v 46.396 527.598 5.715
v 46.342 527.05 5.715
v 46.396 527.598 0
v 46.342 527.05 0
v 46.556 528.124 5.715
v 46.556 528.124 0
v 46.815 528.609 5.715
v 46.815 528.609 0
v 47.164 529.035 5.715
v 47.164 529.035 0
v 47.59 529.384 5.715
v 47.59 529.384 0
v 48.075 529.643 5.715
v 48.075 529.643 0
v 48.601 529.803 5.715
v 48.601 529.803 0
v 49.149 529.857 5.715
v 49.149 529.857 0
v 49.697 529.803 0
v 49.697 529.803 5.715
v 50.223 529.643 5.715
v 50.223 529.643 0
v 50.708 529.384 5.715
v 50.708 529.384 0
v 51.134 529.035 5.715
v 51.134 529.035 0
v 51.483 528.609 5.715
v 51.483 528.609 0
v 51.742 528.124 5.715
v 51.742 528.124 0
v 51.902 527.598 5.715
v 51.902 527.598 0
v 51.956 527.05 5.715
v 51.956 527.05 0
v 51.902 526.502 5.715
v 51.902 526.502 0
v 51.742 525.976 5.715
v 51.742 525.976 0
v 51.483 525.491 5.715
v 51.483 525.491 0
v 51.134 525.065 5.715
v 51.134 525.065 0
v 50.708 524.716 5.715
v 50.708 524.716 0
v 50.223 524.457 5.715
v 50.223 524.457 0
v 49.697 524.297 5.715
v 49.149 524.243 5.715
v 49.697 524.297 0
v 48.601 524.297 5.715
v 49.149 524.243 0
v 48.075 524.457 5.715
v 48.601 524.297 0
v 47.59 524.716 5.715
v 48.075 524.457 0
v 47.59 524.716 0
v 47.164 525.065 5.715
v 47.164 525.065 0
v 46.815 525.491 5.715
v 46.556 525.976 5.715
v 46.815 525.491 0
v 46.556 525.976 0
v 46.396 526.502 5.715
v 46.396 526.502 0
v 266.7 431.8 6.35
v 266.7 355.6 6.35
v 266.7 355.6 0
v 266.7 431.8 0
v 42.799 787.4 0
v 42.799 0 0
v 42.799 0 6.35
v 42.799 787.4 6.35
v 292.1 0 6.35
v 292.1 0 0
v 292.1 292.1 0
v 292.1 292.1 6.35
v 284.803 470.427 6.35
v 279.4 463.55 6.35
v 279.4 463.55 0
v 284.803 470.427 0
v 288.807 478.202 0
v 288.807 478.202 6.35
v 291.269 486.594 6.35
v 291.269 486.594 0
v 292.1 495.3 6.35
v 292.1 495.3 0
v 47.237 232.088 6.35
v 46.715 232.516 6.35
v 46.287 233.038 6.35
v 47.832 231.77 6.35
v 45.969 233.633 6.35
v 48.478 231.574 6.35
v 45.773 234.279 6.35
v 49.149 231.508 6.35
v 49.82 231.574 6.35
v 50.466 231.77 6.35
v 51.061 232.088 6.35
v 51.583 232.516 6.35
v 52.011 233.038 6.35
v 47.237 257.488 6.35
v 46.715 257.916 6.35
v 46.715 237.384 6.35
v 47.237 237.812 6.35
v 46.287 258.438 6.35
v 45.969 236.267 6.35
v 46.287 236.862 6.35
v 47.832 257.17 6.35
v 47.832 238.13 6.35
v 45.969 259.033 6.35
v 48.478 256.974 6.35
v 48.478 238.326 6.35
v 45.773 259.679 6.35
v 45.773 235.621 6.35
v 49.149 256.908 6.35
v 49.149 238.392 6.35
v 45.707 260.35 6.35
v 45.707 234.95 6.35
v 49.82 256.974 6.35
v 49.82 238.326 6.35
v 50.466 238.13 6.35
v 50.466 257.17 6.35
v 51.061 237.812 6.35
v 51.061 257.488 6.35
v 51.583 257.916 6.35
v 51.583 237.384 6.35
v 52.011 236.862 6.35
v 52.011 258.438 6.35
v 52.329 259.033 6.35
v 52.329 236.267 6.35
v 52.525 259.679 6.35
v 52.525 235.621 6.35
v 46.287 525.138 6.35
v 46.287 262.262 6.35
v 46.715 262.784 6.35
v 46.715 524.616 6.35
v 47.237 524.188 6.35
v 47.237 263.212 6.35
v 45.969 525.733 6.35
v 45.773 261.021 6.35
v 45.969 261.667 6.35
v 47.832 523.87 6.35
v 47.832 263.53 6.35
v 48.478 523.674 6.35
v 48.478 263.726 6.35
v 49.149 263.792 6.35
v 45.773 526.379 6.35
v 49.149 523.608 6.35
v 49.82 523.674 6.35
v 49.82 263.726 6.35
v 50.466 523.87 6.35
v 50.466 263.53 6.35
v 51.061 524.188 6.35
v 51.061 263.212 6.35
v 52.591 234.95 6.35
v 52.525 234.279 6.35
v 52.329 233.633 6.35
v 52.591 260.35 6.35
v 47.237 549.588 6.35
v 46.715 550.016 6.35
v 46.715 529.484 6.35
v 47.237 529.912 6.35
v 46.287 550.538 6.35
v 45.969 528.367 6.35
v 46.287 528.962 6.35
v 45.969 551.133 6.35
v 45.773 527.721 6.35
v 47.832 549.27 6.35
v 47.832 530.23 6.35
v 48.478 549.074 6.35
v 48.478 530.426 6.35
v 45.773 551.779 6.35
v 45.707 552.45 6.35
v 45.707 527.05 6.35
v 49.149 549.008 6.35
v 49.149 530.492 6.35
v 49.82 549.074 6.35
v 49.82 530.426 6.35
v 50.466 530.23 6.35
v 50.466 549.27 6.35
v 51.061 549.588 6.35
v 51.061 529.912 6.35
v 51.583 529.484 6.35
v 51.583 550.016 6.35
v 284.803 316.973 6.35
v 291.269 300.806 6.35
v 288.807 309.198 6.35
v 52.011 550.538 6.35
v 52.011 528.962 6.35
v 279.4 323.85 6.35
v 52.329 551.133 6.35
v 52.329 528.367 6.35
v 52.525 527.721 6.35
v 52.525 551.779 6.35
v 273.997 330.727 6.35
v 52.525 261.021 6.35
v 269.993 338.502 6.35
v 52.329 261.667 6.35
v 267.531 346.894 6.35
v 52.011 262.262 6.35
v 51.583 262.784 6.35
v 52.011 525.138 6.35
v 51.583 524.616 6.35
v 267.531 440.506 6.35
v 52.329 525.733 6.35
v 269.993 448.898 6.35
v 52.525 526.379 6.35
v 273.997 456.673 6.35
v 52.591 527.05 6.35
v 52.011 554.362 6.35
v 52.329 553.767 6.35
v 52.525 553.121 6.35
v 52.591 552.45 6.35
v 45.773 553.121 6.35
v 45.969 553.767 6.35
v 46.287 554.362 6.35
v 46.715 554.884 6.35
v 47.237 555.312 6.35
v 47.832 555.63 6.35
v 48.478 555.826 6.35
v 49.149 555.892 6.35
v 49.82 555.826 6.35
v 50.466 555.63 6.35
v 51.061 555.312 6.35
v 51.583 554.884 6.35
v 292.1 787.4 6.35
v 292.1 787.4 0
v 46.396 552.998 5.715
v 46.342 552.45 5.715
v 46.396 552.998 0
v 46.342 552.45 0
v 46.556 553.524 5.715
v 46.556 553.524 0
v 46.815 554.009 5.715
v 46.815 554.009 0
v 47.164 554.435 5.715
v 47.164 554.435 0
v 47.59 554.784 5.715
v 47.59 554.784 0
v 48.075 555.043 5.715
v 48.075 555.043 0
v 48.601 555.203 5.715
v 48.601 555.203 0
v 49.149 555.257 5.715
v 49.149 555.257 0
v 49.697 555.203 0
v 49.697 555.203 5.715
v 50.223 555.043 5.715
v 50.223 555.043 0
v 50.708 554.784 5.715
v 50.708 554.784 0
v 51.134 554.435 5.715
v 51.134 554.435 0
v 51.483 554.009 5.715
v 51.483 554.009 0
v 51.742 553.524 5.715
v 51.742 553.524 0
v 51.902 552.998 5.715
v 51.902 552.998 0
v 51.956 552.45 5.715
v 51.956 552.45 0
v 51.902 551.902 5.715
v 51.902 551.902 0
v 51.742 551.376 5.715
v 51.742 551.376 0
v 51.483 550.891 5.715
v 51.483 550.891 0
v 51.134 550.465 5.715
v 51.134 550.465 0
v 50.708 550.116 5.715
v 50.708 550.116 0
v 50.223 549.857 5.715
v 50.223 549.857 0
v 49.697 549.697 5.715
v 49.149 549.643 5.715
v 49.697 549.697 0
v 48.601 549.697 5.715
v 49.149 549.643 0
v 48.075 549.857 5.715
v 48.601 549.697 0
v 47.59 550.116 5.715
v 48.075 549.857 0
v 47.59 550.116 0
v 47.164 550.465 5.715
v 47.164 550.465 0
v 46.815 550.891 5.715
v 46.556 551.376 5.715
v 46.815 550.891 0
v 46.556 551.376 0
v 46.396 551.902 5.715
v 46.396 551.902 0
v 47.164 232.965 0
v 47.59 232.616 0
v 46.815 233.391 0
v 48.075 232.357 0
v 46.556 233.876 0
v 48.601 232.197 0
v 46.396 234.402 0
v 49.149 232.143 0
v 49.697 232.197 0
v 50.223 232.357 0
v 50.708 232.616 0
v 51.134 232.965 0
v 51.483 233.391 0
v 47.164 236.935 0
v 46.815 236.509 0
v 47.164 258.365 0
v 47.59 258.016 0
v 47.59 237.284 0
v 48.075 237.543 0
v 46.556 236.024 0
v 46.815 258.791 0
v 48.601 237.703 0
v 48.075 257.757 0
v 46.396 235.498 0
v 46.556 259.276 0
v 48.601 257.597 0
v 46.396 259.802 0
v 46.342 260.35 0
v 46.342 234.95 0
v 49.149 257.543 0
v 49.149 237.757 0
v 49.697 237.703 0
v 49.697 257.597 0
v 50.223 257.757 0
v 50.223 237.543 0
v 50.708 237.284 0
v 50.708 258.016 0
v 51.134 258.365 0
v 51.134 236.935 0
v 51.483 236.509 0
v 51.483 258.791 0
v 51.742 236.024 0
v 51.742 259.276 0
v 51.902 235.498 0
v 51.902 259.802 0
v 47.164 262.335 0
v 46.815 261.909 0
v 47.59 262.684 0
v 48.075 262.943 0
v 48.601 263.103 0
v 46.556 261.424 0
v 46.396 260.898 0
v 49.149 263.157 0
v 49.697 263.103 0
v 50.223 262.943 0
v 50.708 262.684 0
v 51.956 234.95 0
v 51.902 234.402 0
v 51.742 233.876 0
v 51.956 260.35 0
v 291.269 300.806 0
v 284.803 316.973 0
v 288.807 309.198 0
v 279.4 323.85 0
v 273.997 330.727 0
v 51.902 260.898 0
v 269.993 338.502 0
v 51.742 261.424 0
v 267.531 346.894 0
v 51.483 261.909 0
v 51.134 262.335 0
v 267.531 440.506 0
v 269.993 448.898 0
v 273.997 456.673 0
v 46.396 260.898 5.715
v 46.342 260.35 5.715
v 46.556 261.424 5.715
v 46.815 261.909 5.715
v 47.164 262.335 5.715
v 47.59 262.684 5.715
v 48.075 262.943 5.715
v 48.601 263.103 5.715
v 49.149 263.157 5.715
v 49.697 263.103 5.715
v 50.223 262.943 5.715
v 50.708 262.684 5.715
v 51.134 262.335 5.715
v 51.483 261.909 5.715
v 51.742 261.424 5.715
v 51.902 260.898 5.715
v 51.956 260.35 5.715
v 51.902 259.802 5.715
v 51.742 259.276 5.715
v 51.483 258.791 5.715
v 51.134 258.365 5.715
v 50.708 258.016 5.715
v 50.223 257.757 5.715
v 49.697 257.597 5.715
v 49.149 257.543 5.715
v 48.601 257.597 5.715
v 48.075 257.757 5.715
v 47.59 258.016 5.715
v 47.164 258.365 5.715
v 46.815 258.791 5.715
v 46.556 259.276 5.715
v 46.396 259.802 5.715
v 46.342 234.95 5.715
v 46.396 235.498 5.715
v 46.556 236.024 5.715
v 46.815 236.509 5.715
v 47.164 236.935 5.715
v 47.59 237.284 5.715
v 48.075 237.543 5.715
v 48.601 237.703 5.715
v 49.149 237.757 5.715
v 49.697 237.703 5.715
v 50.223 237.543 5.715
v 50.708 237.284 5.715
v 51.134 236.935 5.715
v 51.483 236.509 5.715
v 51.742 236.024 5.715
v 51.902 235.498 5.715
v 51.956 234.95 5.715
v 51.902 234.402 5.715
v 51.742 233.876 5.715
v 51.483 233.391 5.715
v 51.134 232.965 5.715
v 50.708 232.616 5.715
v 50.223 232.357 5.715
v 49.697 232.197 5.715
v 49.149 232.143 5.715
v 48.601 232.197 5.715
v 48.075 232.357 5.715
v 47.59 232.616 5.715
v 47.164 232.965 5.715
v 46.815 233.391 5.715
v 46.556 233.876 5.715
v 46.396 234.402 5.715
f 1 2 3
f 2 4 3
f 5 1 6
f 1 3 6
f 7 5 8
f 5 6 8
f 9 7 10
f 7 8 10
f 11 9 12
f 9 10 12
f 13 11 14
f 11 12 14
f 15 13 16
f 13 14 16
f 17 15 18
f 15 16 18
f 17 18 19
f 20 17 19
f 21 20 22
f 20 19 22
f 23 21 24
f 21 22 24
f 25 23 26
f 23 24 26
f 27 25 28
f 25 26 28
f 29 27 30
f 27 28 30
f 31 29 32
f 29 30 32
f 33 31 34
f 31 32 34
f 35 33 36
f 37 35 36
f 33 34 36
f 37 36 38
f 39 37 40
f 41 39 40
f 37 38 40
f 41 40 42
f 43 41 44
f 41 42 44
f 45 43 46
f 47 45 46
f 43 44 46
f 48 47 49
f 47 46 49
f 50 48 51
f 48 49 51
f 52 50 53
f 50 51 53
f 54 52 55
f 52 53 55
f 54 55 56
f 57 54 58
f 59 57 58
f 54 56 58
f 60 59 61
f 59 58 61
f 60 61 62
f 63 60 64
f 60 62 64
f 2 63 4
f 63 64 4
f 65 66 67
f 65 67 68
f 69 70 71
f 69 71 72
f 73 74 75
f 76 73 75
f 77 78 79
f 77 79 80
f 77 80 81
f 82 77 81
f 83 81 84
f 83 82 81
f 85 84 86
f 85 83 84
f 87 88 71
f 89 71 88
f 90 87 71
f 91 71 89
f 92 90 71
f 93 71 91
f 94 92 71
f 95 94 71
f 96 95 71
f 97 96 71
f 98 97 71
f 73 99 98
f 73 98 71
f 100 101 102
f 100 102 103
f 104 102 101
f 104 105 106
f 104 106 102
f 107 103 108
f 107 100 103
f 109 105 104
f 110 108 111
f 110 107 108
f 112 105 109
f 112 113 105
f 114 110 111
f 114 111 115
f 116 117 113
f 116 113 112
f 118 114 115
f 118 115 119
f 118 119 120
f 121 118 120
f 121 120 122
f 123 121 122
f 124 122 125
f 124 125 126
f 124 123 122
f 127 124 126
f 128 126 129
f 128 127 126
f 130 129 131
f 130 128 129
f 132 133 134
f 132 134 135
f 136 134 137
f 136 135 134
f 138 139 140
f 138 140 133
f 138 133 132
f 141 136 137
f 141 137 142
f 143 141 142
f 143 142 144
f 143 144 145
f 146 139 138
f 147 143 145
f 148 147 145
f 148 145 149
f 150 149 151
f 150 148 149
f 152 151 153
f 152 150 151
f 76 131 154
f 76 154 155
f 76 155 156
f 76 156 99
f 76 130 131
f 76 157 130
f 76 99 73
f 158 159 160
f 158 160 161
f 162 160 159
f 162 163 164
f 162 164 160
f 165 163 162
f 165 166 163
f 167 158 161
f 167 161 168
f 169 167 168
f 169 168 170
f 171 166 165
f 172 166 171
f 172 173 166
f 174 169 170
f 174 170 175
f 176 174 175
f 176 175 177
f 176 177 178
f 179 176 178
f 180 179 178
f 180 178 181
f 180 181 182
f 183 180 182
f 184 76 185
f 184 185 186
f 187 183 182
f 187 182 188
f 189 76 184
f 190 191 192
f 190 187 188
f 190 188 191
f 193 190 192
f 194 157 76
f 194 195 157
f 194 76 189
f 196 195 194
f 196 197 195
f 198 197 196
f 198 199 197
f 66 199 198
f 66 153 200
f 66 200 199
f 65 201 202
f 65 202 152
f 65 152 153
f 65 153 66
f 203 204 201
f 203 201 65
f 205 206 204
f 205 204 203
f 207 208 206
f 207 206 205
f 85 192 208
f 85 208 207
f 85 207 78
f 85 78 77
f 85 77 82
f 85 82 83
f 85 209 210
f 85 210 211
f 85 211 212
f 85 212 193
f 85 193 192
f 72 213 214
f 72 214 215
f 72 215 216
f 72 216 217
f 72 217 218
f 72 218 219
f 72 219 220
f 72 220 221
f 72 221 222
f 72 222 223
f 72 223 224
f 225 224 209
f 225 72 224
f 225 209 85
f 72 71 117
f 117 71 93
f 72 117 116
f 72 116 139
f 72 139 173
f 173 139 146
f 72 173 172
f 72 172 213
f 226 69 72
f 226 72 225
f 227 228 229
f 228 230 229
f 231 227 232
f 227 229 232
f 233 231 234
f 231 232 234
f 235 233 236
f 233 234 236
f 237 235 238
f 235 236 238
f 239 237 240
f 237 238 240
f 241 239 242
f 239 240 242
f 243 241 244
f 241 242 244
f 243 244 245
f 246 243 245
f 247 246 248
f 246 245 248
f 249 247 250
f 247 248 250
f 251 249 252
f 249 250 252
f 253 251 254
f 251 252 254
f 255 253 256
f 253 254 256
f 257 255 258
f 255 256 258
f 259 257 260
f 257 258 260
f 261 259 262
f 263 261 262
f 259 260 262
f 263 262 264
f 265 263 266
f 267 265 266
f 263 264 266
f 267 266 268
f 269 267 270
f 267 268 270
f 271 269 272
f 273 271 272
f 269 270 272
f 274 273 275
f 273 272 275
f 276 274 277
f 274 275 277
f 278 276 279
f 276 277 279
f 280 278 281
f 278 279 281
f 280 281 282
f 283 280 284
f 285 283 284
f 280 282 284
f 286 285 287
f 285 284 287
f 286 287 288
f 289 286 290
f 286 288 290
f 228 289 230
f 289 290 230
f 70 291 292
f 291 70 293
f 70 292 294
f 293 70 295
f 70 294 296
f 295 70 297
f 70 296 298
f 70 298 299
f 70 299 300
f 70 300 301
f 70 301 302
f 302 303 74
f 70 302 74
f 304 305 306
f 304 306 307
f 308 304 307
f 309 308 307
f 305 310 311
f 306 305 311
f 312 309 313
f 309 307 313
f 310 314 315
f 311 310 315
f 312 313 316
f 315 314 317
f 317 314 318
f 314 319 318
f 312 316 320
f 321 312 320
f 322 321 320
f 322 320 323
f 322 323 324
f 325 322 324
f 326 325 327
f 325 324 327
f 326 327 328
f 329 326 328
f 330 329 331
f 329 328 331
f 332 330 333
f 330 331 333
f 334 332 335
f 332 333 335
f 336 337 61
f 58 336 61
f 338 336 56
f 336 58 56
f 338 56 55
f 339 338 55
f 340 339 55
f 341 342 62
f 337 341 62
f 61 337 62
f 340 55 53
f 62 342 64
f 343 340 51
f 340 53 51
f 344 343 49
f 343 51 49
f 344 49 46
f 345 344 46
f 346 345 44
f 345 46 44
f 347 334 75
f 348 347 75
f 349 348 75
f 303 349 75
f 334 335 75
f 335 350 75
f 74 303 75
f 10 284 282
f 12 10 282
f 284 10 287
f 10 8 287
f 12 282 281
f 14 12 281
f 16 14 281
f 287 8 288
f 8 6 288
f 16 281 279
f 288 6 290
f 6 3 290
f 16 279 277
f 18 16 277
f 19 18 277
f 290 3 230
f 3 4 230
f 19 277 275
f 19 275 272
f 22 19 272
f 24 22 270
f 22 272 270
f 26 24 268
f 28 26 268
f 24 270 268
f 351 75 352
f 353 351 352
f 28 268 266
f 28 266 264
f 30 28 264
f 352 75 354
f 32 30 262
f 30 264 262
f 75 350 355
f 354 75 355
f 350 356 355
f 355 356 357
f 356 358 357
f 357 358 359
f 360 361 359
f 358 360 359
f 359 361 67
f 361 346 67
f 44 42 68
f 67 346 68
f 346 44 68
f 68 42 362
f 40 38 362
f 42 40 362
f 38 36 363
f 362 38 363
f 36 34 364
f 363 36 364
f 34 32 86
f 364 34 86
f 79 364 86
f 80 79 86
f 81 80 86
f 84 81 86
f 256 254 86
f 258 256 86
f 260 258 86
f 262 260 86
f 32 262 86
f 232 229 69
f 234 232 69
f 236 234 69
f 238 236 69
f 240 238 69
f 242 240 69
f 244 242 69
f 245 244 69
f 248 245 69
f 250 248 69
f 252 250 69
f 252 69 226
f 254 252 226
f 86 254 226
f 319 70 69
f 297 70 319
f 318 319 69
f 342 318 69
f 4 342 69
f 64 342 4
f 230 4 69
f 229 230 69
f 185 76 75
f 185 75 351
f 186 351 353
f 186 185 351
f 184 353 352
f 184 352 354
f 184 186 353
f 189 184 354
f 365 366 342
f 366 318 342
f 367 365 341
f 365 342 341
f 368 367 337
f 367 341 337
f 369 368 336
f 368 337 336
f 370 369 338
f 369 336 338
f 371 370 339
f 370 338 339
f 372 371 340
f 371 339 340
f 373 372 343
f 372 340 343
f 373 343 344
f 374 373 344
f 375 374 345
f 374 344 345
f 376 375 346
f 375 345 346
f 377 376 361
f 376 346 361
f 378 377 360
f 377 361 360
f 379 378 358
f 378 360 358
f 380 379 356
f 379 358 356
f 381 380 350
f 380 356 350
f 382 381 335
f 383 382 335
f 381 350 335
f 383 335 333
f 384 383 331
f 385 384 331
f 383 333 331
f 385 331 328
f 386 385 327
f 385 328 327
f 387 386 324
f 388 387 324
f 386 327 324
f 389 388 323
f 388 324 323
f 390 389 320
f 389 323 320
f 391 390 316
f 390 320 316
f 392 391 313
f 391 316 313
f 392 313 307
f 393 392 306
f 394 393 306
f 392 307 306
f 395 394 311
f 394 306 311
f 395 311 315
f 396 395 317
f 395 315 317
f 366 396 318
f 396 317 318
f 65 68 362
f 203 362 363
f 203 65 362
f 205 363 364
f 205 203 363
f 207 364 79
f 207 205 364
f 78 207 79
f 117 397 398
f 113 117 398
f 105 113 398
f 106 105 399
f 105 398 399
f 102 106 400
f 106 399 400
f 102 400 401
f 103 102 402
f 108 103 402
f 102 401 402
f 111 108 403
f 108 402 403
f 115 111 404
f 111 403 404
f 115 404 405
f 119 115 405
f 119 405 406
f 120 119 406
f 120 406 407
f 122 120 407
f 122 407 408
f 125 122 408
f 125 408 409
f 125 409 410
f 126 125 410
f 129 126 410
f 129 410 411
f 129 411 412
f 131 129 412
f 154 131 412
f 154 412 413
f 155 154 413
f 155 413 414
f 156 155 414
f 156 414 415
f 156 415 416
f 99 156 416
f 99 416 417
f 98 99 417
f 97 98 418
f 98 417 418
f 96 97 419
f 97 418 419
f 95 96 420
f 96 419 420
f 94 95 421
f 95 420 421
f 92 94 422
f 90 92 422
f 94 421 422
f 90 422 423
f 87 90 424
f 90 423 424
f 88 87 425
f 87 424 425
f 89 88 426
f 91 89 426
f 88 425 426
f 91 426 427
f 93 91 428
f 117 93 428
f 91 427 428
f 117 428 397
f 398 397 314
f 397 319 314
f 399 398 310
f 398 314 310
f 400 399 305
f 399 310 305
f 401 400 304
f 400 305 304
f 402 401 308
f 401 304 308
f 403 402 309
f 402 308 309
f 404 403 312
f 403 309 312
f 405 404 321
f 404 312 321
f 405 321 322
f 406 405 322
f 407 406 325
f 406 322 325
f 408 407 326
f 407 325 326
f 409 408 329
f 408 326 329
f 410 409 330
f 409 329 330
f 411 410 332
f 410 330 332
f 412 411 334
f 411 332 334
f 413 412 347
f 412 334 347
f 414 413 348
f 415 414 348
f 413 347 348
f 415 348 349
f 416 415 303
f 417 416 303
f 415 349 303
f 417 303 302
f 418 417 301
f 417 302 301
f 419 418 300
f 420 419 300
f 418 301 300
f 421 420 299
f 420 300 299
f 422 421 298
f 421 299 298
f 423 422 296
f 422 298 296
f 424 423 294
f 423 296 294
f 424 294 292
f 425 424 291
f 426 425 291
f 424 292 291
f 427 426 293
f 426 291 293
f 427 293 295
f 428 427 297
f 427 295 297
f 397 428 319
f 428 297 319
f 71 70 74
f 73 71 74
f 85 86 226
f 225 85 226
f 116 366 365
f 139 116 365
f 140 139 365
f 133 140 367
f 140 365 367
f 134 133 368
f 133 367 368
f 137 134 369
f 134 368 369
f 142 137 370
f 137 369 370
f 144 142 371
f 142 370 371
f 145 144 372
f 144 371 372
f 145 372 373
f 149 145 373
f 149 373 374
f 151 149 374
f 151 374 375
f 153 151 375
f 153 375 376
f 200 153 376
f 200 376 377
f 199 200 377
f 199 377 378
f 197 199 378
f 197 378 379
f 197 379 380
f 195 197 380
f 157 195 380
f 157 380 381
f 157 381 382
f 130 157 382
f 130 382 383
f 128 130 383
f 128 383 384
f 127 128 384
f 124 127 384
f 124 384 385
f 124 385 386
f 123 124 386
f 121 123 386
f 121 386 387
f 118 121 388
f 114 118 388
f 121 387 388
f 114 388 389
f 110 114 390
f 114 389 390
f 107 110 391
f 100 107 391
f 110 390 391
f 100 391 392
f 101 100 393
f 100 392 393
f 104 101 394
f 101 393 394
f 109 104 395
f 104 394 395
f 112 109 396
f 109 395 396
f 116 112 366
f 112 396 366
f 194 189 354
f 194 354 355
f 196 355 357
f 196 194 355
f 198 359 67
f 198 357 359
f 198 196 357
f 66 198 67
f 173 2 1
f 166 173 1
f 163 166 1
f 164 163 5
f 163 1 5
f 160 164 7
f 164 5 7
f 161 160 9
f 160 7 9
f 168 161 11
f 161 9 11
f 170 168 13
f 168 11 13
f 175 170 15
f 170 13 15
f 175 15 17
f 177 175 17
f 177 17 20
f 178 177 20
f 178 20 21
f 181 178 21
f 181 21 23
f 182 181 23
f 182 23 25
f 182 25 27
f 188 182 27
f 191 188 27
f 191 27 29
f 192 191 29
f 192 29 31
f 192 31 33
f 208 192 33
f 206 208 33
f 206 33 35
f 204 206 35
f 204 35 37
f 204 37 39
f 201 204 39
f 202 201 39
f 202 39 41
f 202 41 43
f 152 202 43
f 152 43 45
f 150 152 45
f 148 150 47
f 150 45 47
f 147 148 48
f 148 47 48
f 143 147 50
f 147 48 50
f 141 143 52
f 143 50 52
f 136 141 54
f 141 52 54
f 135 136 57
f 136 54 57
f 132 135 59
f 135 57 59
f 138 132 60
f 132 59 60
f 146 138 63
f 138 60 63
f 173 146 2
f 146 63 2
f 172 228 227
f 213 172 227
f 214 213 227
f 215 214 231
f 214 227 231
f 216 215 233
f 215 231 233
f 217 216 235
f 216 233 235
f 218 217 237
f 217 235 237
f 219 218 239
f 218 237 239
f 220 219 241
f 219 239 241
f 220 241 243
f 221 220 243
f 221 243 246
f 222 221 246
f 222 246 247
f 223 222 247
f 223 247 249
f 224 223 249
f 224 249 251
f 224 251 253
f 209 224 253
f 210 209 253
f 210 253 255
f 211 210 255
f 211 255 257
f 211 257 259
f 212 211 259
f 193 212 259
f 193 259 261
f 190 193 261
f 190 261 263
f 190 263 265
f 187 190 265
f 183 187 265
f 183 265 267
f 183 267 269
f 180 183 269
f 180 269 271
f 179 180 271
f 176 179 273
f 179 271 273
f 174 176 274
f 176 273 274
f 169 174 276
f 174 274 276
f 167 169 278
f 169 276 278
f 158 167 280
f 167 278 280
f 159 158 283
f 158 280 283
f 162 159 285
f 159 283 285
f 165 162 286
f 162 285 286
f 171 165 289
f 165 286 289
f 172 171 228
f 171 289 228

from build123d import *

# Parameters (mm, degrees)
SKETCH1_W                        = 249.301
SKETCH1_H                        = 787.4
BOSS_EXTRUDE1_DEPTH              = 6.35
F_10_CLEARANCE_HOLE1_D           = 5.6134
F_10_CLEARANCE_HOLE1_CSINK_D     = 6.8834
F_10_CLEARANCE_HOLE1_CSINK_ANGLE = 90
CUT_EXTRUDE1_DEPTH               = 840.858019251


with BuildPart() as part:
    # Sketch1 → Boss-Extrude1 (new body)
    with BuildSketch(Plane.XY):
        with Locations((167.4495, 393.7)):
            Rectangle(SKETCH1_W, SKETCH1_H)
    extrude(amount=BOSS_EXTRUDE1_DEPTH)

    # #10 Clearance Hole1 (through all)
    with Locations(Plane.XY.offset(6.35)):
        with Locations((49.149, 552.45), (49.149, 527.05), (49.149, 260.35), (49.149, 234.95)):
            CounterSinkHole(F_10_CLEARANCE_HOLE1_D / 2, F_10_CLEARANCE_HOLE1_CSINK_D / 2, counter_sink_angle=F_10_CLEARANCE_HOLE1_CSINK_ANGLE)

    # Sketch6 → Cut-Extrude1 (cut, through all)
    with BuildSketch(Plane.XY.offset(6.35)):
        with BuildLine():
            Line((292.1, 495.3), (304.8, 495.3))
            Line((304.8, 495.3), (304.8, 292.1))
            Line((304.8, 292.1), (292.1, 292.1))
            ThreePointArc((292.1, 292.1), (288.807245657, 309.197898263), (279.4, 323.85))
            ThreePointArc((279.4, 323.85), (269.992754343, 338.502101737), (266.7, 355.6))
            Line((266.7, 355.6), (266.7, 431.8))
            ThreePointArc((266.7, 431.8), (269.992754343, 448.897898263), (279.4, 463.55))
            ThreePointArc((279.4, 463.55), (288.807245657, 478.202101737), (292.1, 495.3))
        make_face()
    extrude(amount=-CUT_EXTRUDE1_DEPTH, mode=Mode.SUBTRACT)


solid = part.part
